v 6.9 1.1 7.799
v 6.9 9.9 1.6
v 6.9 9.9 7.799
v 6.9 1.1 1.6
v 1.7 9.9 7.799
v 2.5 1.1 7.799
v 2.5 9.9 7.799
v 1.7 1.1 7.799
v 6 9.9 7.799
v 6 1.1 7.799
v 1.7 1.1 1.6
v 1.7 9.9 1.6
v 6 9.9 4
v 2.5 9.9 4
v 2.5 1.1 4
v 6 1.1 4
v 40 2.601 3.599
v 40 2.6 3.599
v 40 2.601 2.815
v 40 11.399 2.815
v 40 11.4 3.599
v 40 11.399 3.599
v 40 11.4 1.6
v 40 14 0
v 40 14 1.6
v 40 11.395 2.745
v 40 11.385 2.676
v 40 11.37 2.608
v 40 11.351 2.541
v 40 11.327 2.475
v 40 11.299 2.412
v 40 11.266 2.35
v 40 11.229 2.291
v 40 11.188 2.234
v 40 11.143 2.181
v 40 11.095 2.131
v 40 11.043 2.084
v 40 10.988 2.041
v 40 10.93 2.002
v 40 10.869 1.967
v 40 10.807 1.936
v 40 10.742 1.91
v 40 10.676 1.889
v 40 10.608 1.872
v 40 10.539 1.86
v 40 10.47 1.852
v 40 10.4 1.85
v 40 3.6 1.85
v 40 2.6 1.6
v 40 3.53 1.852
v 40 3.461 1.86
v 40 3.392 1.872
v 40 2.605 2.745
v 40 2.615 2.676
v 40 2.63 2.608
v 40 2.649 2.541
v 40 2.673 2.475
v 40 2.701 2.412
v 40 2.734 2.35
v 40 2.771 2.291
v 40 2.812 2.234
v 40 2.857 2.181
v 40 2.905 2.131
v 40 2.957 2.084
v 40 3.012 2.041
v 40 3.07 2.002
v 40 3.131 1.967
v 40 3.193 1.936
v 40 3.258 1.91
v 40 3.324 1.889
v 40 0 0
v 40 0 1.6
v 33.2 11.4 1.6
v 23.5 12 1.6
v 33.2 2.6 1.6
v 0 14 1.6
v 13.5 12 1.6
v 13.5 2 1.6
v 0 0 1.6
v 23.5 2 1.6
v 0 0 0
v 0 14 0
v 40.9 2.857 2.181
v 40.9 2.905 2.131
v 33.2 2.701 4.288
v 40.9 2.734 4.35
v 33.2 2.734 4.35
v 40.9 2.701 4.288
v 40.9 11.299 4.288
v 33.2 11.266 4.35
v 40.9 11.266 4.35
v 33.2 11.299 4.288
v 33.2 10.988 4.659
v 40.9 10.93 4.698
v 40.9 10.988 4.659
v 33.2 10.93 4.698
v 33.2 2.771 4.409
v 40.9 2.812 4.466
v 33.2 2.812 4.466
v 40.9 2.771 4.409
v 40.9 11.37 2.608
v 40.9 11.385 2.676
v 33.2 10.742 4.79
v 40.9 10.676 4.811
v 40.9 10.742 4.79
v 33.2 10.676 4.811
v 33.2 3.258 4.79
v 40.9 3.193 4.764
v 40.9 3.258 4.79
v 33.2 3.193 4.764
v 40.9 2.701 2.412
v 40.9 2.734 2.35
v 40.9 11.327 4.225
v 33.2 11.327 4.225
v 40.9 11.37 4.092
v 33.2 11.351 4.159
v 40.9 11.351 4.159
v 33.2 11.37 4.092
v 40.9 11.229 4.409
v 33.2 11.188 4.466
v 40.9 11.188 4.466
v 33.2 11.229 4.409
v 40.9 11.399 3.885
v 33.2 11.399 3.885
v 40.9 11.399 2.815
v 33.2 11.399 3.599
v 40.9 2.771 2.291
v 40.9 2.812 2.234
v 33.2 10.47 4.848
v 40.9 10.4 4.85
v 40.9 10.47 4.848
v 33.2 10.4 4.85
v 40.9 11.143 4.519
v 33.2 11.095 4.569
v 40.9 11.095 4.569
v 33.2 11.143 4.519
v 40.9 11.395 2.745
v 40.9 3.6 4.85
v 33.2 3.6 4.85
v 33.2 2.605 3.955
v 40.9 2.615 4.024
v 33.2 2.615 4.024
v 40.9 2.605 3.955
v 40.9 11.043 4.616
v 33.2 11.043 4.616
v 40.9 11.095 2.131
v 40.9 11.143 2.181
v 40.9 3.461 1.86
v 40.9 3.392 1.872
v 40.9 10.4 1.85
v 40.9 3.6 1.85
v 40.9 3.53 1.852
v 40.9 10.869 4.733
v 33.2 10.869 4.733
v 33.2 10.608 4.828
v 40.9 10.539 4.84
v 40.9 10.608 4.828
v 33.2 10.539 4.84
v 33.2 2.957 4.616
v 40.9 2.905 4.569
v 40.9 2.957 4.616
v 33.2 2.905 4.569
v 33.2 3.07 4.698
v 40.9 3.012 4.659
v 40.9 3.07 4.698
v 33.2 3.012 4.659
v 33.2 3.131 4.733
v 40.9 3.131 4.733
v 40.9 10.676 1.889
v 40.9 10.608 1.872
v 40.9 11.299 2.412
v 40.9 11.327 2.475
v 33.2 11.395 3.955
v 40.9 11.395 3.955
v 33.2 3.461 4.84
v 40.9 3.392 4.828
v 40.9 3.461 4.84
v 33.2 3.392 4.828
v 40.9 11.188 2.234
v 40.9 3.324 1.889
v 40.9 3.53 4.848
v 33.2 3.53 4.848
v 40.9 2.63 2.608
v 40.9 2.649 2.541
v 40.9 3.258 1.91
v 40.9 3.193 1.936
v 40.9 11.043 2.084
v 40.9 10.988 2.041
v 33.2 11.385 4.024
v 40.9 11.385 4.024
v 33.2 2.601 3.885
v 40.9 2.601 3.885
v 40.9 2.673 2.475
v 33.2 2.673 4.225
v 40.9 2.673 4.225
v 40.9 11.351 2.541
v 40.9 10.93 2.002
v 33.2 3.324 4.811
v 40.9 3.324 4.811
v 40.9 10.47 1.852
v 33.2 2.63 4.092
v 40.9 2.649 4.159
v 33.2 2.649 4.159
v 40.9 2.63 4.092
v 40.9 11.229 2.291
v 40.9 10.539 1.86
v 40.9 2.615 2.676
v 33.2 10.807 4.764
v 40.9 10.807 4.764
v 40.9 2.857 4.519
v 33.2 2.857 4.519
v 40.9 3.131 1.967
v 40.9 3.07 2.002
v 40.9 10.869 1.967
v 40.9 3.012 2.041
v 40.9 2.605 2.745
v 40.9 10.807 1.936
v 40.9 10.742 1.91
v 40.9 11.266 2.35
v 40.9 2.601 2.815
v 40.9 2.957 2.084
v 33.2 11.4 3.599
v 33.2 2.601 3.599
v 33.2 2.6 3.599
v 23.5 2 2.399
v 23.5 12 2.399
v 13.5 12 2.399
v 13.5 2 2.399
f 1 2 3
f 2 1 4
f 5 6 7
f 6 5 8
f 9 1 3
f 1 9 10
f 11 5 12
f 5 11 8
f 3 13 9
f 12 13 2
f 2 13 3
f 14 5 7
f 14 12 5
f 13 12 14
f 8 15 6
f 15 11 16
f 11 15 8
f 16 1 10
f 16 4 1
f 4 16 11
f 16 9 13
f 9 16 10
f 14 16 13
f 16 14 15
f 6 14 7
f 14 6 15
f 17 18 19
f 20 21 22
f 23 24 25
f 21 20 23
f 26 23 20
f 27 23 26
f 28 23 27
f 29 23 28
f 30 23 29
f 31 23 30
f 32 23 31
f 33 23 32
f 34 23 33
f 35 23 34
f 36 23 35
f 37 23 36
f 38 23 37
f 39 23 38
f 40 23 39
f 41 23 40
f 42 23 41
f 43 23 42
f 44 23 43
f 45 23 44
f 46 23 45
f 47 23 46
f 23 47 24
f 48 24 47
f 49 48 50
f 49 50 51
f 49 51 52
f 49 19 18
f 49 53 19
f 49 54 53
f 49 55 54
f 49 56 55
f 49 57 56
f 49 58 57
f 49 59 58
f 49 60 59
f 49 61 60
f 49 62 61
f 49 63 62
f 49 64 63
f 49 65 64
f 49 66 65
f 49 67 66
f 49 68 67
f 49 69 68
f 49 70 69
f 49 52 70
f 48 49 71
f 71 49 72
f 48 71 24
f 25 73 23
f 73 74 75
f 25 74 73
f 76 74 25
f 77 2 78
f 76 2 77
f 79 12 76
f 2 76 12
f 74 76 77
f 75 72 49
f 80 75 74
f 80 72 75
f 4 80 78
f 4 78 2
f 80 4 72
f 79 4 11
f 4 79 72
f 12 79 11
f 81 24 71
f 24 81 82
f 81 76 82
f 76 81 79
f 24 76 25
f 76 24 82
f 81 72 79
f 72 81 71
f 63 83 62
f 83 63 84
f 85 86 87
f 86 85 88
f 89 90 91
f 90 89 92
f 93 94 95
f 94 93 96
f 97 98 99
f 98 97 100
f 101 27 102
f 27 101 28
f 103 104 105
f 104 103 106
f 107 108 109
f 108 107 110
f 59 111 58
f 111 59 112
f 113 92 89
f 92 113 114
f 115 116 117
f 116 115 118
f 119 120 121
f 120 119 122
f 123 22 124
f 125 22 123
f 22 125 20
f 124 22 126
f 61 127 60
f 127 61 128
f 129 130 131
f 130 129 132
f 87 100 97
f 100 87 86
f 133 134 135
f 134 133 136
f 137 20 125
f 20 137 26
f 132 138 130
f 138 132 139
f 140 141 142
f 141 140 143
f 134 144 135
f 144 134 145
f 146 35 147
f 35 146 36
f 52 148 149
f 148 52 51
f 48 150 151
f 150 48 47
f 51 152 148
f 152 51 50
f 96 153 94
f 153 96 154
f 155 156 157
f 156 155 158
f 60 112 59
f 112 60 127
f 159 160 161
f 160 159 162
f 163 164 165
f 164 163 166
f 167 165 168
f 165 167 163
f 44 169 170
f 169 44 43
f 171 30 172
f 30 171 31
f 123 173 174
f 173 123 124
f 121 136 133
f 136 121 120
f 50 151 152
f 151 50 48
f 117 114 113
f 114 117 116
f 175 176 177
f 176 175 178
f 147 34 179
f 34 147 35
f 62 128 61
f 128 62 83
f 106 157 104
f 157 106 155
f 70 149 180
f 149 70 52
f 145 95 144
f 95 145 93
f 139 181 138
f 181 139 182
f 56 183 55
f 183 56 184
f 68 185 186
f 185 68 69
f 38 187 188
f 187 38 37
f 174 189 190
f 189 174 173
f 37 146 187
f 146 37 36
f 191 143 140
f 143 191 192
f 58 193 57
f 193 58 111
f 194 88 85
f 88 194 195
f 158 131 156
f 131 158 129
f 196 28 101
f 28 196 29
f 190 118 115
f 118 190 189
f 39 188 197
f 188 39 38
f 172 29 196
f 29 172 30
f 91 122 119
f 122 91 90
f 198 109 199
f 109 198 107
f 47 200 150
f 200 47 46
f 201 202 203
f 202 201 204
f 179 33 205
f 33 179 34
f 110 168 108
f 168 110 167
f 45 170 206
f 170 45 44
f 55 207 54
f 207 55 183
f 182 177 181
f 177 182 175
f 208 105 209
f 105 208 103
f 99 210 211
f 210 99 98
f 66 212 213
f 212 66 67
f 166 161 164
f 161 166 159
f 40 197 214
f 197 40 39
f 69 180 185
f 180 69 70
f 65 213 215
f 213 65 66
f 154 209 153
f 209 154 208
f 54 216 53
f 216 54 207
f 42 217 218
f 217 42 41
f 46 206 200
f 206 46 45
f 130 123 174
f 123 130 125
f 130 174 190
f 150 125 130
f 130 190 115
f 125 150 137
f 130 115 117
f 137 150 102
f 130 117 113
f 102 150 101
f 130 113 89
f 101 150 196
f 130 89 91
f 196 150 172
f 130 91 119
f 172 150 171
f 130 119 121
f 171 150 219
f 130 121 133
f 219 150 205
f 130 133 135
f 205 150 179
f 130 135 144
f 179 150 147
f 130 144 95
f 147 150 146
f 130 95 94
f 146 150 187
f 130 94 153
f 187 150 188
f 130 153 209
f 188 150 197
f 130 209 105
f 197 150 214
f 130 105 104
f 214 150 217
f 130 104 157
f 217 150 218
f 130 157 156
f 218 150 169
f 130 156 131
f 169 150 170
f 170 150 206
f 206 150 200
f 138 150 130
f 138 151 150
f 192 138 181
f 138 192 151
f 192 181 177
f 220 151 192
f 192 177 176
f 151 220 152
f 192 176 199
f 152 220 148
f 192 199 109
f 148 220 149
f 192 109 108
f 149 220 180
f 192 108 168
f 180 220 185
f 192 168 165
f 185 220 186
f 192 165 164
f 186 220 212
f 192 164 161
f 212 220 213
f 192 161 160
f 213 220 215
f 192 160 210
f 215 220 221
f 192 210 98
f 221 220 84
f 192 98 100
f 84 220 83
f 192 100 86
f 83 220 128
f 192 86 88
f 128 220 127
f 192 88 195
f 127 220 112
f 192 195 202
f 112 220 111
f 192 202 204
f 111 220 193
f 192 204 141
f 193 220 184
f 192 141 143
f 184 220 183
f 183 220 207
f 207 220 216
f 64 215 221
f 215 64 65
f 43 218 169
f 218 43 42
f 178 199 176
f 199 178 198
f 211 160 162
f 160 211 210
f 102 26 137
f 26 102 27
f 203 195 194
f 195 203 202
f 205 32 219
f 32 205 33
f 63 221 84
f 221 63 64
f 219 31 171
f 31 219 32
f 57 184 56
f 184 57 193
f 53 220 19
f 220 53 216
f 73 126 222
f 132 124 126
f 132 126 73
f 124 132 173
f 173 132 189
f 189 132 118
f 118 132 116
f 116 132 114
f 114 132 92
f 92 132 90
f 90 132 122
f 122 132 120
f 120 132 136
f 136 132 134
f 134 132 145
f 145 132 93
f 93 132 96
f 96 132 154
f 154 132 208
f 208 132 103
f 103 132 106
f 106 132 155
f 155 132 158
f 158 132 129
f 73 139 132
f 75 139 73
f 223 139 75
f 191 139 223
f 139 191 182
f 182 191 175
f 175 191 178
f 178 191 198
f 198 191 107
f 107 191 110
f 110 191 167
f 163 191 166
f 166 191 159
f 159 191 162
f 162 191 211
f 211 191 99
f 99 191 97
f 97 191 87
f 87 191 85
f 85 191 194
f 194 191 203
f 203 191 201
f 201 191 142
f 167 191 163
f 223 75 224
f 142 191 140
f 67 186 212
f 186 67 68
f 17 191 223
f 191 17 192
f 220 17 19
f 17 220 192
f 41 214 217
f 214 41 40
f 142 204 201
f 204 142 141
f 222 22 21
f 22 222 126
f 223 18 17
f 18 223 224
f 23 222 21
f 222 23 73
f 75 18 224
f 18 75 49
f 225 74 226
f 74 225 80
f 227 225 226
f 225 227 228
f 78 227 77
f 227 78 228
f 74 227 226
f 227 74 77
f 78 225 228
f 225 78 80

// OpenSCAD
$fn = 90;

E = 0.001;

// Reference board (remove * to show, n.b. it's a bit slow)
*color("green")
	translate([0, 0, 0])
		scale([25.4, 25.4, 25.4])
			import("hs-probe-pcb.stl");

cube([40, 14, 1.6]);


translate([33.2, 7, 3.35]) hull() for(i = [
  [-1, -1],
  [+1, -1],
  [-1, +1],
  [+1, +1],
]) {
  translate([0, i[0] * 3.4, i[1] * 0.5])
    rotate(90, [0, 1, 0])
      cylinder(r=1, h=7.7);
}

#translate([33.2, 2.6, 1.6 - E]) cube([6.8, 8.8, 2]);

translate([13.5, 2, 1.6 - E]) cube([10, 10, 0.8]);

difference() {
  translate([1.7, 1.1, 1.6 - E]) cube([5.2, 8.8, 6.2]);

  translate([2.5, 0, 4]) cube([3.5, 20, 6.2]);
}
